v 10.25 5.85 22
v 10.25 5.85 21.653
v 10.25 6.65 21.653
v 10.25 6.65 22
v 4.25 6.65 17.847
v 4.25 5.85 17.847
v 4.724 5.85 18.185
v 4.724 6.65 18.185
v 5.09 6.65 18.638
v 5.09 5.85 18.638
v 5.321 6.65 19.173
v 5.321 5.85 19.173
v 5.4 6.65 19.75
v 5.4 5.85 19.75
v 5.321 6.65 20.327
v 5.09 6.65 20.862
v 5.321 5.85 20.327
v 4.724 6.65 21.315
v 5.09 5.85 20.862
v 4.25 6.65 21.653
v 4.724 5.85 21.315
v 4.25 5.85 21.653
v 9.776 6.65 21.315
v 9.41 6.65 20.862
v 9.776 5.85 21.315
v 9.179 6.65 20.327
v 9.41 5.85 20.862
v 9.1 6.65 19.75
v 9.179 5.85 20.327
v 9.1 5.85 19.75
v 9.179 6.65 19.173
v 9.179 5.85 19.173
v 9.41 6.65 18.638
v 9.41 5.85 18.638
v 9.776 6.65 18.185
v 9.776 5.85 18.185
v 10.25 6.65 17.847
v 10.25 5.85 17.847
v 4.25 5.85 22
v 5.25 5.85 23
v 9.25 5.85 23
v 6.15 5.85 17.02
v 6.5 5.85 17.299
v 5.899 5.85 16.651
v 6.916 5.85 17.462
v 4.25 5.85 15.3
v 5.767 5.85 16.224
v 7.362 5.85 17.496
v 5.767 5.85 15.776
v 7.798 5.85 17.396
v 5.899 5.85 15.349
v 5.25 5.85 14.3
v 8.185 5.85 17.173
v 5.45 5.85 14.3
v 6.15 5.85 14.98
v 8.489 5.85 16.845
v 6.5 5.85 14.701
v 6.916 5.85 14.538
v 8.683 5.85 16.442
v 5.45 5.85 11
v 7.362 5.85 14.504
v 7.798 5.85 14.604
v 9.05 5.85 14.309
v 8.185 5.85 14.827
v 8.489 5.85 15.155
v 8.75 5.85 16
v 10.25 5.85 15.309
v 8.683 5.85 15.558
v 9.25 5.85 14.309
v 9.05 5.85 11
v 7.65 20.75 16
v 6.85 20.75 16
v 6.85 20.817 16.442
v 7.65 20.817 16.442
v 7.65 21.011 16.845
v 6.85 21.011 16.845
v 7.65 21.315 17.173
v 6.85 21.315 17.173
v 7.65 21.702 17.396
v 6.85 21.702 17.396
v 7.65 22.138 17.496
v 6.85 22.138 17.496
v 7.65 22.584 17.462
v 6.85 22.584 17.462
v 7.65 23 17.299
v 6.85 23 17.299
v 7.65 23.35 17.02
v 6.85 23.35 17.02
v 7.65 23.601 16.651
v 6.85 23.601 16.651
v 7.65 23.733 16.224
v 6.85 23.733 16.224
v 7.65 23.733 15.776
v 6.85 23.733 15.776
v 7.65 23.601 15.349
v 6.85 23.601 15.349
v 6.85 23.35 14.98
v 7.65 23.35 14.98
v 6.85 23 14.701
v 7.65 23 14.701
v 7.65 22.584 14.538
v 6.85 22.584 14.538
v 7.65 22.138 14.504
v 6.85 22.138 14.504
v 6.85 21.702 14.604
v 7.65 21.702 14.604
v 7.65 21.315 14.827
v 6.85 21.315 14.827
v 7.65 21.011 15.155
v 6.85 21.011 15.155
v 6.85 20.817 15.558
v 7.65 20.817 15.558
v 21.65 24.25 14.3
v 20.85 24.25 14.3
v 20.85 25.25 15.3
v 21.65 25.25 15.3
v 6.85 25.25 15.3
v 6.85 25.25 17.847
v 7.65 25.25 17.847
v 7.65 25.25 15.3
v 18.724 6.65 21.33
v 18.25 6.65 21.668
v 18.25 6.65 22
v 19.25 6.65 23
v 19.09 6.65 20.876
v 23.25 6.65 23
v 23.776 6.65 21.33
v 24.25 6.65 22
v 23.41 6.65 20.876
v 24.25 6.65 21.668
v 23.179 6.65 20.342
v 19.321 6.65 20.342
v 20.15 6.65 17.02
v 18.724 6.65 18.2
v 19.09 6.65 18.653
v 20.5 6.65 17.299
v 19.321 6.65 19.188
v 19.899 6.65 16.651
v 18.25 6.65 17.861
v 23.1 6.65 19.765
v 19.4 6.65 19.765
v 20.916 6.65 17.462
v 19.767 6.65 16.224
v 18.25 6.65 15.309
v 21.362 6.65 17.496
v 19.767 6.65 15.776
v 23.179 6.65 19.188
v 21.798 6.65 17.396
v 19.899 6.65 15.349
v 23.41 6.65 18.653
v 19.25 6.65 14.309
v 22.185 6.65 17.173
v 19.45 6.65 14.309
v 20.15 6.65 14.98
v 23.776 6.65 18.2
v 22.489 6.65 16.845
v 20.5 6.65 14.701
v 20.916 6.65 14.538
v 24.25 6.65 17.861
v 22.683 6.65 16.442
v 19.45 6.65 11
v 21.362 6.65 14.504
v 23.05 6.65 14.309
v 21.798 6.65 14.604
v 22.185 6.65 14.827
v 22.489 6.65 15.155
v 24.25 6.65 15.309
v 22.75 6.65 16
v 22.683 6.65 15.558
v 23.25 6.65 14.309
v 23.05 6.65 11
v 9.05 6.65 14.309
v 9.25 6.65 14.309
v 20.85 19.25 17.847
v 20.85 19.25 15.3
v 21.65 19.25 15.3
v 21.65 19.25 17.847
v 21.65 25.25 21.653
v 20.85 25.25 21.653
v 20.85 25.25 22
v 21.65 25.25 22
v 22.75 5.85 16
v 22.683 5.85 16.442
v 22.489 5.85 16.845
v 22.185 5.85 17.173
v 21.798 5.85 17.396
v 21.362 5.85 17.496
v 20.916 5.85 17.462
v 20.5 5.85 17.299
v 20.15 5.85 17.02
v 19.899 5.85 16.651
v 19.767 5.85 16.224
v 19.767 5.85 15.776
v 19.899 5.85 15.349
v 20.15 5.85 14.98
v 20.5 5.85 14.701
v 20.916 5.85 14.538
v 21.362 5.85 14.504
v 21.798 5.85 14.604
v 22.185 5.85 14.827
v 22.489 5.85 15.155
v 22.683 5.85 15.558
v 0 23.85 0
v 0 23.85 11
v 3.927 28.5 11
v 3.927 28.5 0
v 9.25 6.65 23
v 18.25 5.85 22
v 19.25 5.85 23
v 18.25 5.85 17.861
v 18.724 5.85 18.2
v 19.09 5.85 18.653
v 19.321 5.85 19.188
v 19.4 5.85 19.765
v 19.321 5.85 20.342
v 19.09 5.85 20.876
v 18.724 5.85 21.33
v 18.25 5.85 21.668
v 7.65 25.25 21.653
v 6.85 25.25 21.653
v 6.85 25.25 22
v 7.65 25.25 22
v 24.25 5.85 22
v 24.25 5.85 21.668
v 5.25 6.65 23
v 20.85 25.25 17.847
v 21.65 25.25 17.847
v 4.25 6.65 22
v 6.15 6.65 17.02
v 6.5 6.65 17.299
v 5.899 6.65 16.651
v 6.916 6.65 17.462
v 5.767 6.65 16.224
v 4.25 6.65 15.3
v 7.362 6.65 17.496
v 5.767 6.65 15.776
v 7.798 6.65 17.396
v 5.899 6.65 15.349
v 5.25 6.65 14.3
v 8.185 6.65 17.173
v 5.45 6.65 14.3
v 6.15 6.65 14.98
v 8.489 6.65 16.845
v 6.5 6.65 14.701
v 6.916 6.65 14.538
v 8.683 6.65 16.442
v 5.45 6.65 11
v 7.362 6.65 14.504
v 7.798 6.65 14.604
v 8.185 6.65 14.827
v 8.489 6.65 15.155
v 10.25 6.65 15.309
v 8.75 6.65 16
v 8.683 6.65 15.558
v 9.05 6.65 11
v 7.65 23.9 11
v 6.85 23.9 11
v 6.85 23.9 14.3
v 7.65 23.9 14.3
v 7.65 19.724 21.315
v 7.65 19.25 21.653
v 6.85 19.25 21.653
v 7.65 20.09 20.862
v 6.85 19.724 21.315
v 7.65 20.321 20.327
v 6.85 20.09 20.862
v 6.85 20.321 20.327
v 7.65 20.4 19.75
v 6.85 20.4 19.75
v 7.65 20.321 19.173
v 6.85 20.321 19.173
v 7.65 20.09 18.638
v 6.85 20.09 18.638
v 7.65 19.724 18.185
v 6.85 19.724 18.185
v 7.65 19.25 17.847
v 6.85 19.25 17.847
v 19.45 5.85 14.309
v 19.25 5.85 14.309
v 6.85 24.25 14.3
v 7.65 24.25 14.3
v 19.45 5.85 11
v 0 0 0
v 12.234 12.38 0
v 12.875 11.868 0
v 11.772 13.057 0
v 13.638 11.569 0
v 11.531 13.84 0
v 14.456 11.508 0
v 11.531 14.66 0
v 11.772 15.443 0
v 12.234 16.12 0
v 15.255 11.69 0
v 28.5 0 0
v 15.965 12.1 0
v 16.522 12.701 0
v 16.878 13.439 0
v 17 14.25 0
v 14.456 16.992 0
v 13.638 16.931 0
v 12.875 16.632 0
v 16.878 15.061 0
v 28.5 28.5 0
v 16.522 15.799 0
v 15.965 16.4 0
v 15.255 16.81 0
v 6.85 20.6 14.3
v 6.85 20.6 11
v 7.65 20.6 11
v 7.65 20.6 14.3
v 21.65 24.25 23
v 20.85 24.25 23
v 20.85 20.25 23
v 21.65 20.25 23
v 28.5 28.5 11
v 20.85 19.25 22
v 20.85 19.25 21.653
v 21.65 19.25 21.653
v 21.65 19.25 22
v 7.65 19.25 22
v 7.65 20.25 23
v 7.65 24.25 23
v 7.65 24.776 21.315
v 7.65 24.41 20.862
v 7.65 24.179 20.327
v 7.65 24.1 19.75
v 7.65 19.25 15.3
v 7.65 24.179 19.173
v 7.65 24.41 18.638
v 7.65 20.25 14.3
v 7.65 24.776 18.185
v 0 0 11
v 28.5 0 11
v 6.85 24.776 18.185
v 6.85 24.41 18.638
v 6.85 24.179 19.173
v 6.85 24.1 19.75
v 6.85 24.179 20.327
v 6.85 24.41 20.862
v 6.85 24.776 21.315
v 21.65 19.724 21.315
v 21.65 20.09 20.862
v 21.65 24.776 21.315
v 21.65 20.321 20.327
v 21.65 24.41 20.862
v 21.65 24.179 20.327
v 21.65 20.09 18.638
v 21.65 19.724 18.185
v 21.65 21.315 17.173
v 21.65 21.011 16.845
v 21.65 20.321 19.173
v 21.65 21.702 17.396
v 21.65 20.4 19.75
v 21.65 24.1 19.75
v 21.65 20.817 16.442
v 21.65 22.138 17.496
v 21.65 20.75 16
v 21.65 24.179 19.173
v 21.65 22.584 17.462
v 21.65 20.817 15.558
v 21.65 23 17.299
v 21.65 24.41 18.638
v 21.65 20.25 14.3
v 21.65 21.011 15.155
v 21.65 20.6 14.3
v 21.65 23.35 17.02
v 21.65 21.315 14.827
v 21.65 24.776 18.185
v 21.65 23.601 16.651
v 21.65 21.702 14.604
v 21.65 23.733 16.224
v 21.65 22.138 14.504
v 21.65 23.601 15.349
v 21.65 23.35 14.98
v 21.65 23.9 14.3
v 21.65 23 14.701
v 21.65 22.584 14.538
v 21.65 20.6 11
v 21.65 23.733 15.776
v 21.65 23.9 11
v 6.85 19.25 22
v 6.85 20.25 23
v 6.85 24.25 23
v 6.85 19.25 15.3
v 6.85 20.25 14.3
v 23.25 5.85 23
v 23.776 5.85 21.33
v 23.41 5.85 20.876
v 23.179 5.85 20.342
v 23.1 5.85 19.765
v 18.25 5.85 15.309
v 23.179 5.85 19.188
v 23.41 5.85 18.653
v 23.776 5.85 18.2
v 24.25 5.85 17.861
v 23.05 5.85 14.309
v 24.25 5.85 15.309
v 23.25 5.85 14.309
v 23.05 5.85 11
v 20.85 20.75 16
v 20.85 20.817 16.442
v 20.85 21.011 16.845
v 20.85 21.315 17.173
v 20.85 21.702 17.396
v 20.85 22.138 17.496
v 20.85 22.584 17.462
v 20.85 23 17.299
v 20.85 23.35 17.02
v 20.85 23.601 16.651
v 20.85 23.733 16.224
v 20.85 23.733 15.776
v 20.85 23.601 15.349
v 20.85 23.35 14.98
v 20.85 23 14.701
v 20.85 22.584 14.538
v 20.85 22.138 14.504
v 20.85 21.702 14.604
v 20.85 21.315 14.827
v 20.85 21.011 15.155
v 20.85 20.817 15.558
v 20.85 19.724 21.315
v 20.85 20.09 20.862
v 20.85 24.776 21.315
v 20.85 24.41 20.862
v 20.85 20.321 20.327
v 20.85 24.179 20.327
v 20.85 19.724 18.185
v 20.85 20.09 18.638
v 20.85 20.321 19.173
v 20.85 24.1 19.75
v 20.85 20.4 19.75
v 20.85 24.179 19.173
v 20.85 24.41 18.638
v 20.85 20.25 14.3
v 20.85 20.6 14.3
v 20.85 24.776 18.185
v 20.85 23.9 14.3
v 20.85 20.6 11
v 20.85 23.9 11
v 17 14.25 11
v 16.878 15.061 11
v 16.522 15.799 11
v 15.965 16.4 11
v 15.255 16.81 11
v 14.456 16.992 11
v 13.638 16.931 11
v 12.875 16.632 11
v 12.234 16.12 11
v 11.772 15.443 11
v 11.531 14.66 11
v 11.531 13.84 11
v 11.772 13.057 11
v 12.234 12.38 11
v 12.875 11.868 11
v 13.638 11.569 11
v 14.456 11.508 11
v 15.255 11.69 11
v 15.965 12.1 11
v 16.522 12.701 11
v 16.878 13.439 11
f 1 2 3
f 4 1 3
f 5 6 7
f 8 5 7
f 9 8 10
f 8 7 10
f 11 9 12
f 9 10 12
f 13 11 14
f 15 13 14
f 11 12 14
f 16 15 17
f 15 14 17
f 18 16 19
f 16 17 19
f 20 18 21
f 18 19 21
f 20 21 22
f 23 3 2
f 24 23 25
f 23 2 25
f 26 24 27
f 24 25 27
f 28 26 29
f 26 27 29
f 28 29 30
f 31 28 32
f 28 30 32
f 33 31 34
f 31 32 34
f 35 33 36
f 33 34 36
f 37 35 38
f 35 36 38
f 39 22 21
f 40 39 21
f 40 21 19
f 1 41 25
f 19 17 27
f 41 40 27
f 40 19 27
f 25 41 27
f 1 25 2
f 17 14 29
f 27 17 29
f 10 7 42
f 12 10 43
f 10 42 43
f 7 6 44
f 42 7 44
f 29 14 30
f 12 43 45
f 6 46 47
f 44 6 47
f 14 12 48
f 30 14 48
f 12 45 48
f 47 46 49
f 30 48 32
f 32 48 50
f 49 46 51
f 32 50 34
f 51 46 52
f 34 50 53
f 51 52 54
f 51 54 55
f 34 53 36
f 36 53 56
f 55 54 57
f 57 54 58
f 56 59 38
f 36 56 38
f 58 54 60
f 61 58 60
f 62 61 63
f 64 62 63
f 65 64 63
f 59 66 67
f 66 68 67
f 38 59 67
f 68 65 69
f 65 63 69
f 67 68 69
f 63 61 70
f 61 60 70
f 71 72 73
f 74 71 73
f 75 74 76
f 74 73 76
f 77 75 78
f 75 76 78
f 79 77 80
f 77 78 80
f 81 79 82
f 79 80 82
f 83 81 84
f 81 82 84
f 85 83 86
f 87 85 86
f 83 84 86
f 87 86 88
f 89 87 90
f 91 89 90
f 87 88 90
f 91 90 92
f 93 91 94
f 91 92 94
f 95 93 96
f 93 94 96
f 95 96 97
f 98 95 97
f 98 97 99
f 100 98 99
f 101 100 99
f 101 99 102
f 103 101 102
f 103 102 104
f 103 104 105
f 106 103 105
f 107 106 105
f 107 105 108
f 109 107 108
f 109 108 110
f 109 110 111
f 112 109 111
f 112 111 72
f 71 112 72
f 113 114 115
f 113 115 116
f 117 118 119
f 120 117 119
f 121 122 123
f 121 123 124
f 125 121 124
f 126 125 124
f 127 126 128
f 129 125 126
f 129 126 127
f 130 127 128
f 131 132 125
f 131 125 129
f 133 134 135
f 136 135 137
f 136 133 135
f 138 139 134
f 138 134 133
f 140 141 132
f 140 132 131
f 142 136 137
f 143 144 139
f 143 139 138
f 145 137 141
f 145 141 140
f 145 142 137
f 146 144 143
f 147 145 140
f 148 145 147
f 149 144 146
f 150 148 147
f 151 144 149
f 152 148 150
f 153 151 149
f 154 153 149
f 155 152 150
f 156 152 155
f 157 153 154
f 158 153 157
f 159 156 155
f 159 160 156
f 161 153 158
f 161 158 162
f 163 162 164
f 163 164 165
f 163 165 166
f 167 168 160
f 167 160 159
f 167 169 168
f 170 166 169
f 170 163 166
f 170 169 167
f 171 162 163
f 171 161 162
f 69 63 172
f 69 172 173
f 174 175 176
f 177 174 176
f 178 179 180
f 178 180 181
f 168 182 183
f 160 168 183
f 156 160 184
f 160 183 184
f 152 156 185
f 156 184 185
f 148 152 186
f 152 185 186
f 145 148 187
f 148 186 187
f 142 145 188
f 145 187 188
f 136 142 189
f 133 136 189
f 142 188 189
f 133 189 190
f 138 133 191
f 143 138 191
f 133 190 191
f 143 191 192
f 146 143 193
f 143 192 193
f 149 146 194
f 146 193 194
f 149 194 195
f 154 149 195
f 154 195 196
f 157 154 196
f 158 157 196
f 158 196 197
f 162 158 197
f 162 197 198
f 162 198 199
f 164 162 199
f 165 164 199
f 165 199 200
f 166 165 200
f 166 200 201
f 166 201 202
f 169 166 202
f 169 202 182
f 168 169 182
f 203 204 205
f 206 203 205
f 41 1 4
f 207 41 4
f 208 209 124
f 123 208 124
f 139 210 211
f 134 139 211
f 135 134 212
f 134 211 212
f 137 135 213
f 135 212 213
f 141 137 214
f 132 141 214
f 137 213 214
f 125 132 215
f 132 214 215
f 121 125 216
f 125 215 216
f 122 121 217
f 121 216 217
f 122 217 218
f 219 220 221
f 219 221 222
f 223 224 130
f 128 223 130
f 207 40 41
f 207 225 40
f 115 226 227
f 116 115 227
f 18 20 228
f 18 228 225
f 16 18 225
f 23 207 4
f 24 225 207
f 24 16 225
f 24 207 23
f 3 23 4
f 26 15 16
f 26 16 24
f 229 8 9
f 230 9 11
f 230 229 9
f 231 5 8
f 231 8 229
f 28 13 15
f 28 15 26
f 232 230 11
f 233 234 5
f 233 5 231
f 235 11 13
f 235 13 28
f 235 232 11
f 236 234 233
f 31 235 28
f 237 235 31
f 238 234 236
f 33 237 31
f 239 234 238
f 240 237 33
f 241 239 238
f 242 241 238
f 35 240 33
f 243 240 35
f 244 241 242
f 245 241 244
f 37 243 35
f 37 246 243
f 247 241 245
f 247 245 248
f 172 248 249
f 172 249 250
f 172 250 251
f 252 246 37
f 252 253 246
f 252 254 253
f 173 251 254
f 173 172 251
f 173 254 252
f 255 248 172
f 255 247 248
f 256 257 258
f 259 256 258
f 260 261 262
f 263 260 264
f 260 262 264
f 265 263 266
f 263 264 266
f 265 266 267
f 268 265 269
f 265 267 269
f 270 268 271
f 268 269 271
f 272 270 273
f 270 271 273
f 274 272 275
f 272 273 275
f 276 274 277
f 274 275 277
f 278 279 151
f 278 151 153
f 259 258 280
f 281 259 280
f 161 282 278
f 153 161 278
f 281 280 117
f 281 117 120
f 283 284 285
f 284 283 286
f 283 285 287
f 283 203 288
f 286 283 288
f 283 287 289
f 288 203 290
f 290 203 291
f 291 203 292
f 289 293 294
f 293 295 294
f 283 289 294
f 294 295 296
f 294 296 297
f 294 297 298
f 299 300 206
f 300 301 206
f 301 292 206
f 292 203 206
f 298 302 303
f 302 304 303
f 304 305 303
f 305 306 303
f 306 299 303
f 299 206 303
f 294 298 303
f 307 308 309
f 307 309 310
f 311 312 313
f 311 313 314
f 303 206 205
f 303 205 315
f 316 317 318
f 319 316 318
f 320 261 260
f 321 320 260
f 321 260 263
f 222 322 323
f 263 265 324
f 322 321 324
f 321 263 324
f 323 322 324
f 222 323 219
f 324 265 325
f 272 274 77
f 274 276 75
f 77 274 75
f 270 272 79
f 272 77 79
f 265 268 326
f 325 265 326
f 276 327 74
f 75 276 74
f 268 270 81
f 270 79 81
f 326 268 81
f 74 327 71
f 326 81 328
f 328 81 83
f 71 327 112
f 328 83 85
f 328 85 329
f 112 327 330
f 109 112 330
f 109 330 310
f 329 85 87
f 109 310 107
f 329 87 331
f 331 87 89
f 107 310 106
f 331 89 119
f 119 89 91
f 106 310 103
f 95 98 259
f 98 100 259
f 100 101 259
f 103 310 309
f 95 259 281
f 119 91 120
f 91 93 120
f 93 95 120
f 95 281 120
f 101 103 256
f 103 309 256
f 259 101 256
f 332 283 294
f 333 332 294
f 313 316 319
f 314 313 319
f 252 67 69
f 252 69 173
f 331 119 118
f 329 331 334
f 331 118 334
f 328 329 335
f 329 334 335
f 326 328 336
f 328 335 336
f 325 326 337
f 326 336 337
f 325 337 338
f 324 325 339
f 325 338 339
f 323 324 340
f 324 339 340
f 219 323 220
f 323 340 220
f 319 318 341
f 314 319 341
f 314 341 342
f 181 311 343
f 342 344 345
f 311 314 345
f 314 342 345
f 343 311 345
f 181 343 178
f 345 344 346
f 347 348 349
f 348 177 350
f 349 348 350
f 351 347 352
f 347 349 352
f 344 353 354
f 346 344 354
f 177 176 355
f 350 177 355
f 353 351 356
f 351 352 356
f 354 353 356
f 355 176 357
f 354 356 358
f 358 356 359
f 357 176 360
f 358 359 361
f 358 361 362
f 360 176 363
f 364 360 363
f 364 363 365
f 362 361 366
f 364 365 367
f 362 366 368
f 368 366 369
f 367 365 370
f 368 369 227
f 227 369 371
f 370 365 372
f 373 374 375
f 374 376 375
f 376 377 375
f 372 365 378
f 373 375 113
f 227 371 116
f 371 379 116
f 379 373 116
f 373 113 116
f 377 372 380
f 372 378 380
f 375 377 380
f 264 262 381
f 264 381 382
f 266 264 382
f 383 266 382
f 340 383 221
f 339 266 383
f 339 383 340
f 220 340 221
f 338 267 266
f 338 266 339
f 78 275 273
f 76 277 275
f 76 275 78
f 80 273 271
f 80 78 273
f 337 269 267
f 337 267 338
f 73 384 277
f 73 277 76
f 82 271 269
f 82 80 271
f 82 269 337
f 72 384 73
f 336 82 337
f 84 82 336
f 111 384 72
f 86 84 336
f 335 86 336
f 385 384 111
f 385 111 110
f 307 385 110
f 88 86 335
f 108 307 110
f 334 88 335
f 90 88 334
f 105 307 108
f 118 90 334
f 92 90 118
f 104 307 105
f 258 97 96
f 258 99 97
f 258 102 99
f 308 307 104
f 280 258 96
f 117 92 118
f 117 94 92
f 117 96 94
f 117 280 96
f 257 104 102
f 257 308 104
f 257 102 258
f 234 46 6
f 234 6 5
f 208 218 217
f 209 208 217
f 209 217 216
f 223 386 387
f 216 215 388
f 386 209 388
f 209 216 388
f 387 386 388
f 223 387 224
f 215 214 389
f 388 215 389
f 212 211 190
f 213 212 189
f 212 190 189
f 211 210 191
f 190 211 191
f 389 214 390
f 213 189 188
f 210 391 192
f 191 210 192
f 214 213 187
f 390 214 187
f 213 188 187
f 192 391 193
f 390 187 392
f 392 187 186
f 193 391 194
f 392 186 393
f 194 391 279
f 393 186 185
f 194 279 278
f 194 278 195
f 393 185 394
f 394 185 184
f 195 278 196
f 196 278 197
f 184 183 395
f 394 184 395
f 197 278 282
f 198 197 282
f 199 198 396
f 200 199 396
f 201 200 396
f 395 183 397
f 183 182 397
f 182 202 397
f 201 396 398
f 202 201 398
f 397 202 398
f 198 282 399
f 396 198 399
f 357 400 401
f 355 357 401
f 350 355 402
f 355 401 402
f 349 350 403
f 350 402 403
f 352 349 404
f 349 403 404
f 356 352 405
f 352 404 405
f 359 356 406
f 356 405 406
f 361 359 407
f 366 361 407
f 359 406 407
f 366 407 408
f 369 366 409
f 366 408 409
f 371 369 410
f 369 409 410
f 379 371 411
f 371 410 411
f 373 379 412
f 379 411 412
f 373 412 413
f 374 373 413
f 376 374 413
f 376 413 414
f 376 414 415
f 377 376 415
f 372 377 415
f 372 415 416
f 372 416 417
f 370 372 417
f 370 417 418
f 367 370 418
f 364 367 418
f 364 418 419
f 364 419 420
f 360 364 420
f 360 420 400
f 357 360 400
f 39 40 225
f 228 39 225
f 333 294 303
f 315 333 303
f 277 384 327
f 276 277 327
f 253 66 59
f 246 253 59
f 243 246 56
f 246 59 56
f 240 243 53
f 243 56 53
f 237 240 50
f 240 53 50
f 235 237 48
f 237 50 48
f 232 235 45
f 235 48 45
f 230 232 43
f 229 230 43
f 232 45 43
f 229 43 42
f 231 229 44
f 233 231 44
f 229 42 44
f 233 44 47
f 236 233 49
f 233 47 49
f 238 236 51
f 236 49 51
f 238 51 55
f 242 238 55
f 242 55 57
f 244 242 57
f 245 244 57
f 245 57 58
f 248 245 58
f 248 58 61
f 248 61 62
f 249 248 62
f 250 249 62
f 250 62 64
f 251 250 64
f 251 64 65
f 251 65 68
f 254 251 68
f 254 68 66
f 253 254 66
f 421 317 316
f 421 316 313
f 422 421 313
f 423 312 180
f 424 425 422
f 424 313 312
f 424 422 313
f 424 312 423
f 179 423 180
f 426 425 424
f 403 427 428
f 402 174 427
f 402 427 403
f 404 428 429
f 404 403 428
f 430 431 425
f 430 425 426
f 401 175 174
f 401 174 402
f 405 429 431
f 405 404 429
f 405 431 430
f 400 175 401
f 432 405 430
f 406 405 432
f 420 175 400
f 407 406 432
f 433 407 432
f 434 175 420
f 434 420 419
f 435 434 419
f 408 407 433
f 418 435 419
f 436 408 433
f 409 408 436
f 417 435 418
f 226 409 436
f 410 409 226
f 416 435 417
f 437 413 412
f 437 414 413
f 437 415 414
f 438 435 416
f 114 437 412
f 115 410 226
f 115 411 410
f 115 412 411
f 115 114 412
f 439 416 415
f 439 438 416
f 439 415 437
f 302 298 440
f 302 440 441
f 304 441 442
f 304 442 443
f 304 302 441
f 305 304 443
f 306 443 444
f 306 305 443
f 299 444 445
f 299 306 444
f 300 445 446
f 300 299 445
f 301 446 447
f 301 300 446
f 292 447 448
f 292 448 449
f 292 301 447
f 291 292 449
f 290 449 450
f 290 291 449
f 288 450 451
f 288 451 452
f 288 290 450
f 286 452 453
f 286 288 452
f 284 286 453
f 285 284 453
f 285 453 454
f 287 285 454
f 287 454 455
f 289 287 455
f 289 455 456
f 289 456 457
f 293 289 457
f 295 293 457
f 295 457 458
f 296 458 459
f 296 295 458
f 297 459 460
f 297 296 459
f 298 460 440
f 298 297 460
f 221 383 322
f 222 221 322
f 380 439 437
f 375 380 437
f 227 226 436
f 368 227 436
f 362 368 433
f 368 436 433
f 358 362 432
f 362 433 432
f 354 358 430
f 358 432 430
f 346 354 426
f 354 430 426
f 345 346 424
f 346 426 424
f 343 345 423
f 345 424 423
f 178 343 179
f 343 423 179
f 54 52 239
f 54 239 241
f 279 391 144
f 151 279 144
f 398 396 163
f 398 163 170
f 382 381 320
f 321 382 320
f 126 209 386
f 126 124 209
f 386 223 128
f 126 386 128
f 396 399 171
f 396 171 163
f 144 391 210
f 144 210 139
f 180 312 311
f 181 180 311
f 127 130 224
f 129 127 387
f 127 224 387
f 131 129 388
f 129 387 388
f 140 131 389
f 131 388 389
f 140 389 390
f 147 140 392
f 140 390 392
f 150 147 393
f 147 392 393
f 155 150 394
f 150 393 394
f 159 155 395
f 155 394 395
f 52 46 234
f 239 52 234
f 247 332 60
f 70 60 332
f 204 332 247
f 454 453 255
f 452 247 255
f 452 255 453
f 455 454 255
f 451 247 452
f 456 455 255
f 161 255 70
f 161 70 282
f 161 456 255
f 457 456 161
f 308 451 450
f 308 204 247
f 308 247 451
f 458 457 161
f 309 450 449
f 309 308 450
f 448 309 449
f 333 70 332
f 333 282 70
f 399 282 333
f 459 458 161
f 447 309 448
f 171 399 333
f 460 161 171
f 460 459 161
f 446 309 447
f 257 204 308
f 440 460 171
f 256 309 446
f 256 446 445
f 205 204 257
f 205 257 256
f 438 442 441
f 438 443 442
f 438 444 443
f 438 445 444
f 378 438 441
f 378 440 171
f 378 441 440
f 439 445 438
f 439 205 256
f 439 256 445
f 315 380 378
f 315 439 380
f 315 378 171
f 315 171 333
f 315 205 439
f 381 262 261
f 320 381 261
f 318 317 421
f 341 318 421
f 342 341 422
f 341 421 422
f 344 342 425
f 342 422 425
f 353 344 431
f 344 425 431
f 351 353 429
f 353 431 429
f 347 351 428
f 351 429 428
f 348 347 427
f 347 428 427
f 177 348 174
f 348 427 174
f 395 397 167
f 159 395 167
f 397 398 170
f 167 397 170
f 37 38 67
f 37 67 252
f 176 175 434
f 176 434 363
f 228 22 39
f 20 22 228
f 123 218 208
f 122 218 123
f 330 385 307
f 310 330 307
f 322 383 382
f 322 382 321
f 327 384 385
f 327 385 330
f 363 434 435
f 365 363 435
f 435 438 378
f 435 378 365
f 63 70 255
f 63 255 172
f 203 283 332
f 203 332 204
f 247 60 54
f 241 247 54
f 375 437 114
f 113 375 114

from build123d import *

# Parameters (mm, degrees)
SKETCH_1_W          = 28.5
SKETCH_1_H          = 28.5
SKETCH_1_R          = 2.75
EXTRUDE_1_DEPTH     = 11
SKETCH_2_W          = 6
SKETCH_2_H          = 0.8
SKETCH_2_W_2        = 0.8
SKETCH_2_H_2        = 6
EXTRUDE_2_DEPTH     = 12
SKETCH_3_R          = 1.5
SKETCH_3_R_2        = 2.15
SKETCH_3_W          = 1.2
SKETCH_3_H          = 3.3
SKETCH_3_H_2        = 3.309090331
CUT_EXTRUDE_1_DEPTH = 2
SKETCH_4_R          = 1.5
SKETCH_4_R_2        = 2.15
SKETCH_4_W          = 3.3
SKETCH_4_H          = 1.35
CUT_EXTRUDE_2_DEPTH = 20
CHAMFER_1_SIZE      = 1
CUT_EXTRUDE_3_DEPTH = 15


with BuildPart() as part:
    # Эскиз1 → Вытянуть1 (new body)
    with BuildSketch(Plane.XY):
        with Locations((14.25, 14.25)):
            Rectangle(SKETCH_1_W, SKETCH_1_H)
        with Locations((14.25, 14.25)):
            Circle(SKETCH_1_R, mode=Mode.SUBTRACT)
    extrude(amount=EXTRUDE_1_DEPTH)

    # Эскиз2 → Вытянуть2 (add)
    with BuildSketch(Plane.XY.offset(11)):
        with Locations((7.25, 6.25)):
            Rectangle(SKETCH_2_W, SKETCH_2_H)
        with Locations((21.25, 6.25)):
            Rectangle(SKETCH_2_W, SKETCH_2_H)
        with Locations((21.25, 22.25)):
            Rectangle(SKETCH_2_W_2, SKETCH_2_H_2)
        with Locations((7.25, 22.25)):
            Rectangle(SKETCH_2_W_2, SKETCH_2_H_2)
    extrude(amount=EXTRUDE_2_DEPTH)

    # Эскиз3 → Вырез-Вытянуть1 (cut)
    with BuildSketch(Plane.XZ.offset(-5.85)):
        with Locations((7.25, 16)):
            Circle(SKETCH_3_R)
        with Locations((21.25, 16)):
            Circle(SKETCH_3_R)
        with Locations((3.25, 19.75)):
            Circle(SKETCH_3_R_2)
        with Locations((11.25, 19.75)):
            Circle(SKETCH_3_R_2)
        with Locations((17.25, 19.764625166)):
            Circle(SKETCH_3_R_2)
        with Locations((25.25, 19.764625166)):
            Circle(SKETCH_3_R_2)
        with Locations((4.85, 12.65)):
            Rectangle(SKETCH_3_W, SKETCH_3_H)
        with Locations((9.65, 12.654545166)):
            Rectangle(SKETCH_3_W, SKETCH_3_H_2)
        with Locations((18.85, 12.654545166)):
            Rectangle(SKETCH_3_W, SKETCH_3_H_2)
        with Locations((23.65, 12.654545166)):
            Rectangle(SKETCH_3_W, SKETCH_3_H_2)
    extrude(amount=-CUT_EXTRUDE_1_DEPTH, mode=Mode.SUBTRACT)

    # Эскиз4 → Вырез-Вытянуть2 (cut)
    with BuildSketch(Plane.ZY.offset(-6.85)):
        with Locations(Location((16, 22.25, 0), (0, 0, 270))):
            Circle(SKETCH_4_R)
        with Locations((19.75, 18.25)):
            Circle(SKETCH_4_R_2)
        with Locations((19.75, 26.25)):
            Circle(SKETCH_4_R_2)
        with Locations((12.65, 24.575)):
            Rectangle(SKETCH_4_W, SKETCH_4_H)
        with Locations((12.65, 19.925)):
            Rectangle(SKETCH_4_W, SKETCH_4_H)
    extrude(amount=-CUT_EXTRUDE_2_DEPTH, mode=Mode.SUBTRACT)

    # Фаска1
    chamfer_1_edges = [part.edges().sort_by_distance(p)[0] for p in [
        (4.25, 6.25, 14.3),
        (4.25, 6.25, 23),
        (10.25, 6.25, 23),
        (10.25, 6.25, 14.309090331),
        (18.25, 6.25, 14.309090331),
        (18.25, 6.25, 23),
        (24.25, 6.25, 23),
        (24.25, 6.25, 14.309090331),
        (21.25, 25.25, 14.3),
        (21.25, 19.25, 14.3),
        (21.25, 19.25, 23),
        (21.25, 25.25, 23),
        (7.25, 25.25, 14.3),
        (7.25, 19.25, 14.3),
        (7.25, 19.25, 23),
        (7.25, 25.25, 23),
    ]]
    chamfer(chamfer_1_edges, length=CHAMFER_1_SIZE)

    # Эскиз5 → Вырез-Вытянуть3 (cut)
    with BuildSketch(Plane.XY.offset(11)):
        Polygon((3.927388562, 28.5), (0, 28.5), (0, 23.850233168), align=None)
    extrude(amount=-CUT_EXTRUDE_3_DEPTH, mode=Mode.SUBTRACT)


solid = part.part
